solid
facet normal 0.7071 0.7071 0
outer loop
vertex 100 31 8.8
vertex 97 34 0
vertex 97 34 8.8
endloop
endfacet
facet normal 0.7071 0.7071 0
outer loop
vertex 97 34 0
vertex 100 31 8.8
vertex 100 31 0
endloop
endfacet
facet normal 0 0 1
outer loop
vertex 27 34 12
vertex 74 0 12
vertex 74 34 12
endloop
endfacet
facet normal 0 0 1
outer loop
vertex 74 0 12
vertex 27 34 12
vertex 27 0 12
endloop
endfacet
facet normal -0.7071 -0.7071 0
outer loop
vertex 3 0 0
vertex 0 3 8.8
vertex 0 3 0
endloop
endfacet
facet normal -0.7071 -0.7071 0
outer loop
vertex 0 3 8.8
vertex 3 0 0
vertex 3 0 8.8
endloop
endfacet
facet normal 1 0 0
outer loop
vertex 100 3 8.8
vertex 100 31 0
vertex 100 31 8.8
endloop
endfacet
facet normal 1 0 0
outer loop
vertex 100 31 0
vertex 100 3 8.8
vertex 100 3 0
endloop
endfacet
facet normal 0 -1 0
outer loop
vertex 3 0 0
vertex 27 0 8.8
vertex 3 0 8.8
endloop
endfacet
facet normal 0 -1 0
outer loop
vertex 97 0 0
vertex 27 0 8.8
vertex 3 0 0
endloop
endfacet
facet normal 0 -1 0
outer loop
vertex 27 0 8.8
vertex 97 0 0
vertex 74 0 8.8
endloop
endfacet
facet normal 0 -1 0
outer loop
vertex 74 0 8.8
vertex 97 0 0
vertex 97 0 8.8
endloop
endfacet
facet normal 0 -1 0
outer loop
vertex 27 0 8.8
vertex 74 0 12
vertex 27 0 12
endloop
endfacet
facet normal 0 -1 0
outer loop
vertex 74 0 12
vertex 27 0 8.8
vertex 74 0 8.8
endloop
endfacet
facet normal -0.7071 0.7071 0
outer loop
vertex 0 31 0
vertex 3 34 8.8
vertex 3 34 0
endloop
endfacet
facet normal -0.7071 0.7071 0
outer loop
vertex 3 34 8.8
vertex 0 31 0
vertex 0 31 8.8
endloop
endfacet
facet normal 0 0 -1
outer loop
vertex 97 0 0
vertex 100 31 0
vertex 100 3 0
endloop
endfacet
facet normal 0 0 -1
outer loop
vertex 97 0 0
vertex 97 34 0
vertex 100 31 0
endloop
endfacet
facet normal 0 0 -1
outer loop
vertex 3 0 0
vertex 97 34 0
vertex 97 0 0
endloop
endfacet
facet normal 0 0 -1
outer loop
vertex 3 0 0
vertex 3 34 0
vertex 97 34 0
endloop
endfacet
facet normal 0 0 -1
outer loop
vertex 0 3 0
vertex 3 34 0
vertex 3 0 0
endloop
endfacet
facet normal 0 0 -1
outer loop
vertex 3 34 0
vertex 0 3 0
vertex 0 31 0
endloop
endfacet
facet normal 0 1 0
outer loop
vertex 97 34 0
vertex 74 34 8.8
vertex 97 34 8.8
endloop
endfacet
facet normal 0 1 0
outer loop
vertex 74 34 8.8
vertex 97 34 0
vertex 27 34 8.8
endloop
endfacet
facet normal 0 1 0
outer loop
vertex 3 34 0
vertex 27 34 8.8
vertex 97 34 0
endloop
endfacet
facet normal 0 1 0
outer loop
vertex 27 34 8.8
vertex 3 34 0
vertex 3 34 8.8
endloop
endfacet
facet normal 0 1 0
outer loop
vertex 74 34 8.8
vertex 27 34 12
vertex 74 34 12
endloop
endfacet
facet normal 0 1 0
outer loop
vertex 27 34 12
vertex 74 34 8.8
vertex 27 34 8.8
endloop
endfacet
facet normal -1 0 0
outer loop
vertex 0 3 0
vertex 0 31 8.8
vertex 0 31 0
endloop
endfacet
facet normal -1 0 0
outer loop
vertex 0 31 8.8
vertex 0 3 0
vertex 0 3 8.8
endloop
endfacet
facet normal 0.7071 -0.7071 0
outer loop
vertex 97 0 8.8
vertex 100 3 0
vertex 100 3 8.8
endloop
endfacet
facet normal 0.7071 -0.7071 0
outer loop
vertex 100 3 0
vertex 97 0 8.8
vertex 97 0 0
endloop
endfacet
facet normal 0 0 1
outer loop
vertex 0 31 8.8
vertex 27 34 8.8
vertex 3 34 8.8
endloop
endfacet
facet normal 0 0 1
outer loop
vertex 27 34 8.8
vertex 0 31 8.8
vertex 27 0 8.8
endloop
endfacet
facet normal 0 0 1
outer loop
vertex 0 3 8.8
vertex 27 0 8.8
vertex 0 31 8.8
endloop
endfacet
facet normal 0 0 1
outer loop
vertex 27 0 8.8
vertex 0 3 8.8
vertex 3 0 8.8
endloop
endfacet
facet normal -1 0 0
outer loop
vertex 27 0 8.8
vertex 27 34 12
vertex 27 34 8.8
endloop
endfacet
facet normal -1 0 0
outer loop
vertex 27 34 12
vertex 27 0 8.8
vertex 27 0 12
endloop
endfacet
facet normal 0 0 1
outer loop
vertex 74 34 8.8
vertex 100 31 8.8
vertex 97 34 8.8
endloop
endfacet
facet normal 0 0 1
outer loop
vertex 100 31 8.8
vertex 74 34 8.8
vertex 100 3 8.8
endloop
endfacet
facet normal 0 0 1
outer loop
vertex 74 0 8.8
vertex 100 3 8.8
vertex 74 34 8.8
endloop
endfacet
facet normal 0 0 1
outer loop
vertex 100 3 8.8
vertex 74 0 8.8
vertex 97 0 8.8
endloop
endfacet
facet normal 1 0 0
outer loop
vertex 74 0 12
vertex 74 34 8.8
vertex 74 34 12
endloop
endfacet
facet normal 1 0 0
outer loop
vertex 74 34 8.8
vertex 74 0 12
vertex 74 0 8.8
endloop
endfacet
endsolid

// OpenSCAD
$fn = 32;

// ----------------------------------------------------------------------
// Stepped bar: centerstep, 100 x 34 x 12/8.8 mm
// ----------------------------------------------------------------------

// --- parameters (mm) ---
bar_l = 100;              // bar length, X
bar_w = 34;               // bar width, Y
plate_t = 12;             // thickness of the thick zone, Z
thin_t = 8.8;             // thickness of the thin zone
corner_c = 3;             // corner chamfer of the bar
step_cut = 3.2;           // material removed from the thin zone
thick_from = 27;          // start of the thick middle zone
thick_to = 74;            // end of the thick middle zone
depth_1 = 3.2;            // depth of cut 1 from the top face
depth_2 = 3.2;            // depth of cut 2 from the top face

profile = [[3, 0], [97, 0], [100, 3], [100, 31], [97, 34], [3, 34], [0, 31], [0, 3]];  // primary outline, 8 points, counter clockwise
void_1 = [[-1, -1], [27, -1], [27, 35], [-1, 35]];  // thin left end, 4 points
void_2 = [[74, -1], [101, -1], [101, 35], [74, 35]];  // thin right end, 4 points

// --- the one profile operation ---
difference() {
  linear_extrude(height = plate_t) polygon(points = profile);
  translate([0, 0, plate_t - depth_1])
    linear_extrude(height = depth_1 + 1) polygon(points = void_1);
  translate([0, 0, plate_t - depth_2])
    linear_extrude(height = depth_2 + 1) polygon(points = void_2);
}
